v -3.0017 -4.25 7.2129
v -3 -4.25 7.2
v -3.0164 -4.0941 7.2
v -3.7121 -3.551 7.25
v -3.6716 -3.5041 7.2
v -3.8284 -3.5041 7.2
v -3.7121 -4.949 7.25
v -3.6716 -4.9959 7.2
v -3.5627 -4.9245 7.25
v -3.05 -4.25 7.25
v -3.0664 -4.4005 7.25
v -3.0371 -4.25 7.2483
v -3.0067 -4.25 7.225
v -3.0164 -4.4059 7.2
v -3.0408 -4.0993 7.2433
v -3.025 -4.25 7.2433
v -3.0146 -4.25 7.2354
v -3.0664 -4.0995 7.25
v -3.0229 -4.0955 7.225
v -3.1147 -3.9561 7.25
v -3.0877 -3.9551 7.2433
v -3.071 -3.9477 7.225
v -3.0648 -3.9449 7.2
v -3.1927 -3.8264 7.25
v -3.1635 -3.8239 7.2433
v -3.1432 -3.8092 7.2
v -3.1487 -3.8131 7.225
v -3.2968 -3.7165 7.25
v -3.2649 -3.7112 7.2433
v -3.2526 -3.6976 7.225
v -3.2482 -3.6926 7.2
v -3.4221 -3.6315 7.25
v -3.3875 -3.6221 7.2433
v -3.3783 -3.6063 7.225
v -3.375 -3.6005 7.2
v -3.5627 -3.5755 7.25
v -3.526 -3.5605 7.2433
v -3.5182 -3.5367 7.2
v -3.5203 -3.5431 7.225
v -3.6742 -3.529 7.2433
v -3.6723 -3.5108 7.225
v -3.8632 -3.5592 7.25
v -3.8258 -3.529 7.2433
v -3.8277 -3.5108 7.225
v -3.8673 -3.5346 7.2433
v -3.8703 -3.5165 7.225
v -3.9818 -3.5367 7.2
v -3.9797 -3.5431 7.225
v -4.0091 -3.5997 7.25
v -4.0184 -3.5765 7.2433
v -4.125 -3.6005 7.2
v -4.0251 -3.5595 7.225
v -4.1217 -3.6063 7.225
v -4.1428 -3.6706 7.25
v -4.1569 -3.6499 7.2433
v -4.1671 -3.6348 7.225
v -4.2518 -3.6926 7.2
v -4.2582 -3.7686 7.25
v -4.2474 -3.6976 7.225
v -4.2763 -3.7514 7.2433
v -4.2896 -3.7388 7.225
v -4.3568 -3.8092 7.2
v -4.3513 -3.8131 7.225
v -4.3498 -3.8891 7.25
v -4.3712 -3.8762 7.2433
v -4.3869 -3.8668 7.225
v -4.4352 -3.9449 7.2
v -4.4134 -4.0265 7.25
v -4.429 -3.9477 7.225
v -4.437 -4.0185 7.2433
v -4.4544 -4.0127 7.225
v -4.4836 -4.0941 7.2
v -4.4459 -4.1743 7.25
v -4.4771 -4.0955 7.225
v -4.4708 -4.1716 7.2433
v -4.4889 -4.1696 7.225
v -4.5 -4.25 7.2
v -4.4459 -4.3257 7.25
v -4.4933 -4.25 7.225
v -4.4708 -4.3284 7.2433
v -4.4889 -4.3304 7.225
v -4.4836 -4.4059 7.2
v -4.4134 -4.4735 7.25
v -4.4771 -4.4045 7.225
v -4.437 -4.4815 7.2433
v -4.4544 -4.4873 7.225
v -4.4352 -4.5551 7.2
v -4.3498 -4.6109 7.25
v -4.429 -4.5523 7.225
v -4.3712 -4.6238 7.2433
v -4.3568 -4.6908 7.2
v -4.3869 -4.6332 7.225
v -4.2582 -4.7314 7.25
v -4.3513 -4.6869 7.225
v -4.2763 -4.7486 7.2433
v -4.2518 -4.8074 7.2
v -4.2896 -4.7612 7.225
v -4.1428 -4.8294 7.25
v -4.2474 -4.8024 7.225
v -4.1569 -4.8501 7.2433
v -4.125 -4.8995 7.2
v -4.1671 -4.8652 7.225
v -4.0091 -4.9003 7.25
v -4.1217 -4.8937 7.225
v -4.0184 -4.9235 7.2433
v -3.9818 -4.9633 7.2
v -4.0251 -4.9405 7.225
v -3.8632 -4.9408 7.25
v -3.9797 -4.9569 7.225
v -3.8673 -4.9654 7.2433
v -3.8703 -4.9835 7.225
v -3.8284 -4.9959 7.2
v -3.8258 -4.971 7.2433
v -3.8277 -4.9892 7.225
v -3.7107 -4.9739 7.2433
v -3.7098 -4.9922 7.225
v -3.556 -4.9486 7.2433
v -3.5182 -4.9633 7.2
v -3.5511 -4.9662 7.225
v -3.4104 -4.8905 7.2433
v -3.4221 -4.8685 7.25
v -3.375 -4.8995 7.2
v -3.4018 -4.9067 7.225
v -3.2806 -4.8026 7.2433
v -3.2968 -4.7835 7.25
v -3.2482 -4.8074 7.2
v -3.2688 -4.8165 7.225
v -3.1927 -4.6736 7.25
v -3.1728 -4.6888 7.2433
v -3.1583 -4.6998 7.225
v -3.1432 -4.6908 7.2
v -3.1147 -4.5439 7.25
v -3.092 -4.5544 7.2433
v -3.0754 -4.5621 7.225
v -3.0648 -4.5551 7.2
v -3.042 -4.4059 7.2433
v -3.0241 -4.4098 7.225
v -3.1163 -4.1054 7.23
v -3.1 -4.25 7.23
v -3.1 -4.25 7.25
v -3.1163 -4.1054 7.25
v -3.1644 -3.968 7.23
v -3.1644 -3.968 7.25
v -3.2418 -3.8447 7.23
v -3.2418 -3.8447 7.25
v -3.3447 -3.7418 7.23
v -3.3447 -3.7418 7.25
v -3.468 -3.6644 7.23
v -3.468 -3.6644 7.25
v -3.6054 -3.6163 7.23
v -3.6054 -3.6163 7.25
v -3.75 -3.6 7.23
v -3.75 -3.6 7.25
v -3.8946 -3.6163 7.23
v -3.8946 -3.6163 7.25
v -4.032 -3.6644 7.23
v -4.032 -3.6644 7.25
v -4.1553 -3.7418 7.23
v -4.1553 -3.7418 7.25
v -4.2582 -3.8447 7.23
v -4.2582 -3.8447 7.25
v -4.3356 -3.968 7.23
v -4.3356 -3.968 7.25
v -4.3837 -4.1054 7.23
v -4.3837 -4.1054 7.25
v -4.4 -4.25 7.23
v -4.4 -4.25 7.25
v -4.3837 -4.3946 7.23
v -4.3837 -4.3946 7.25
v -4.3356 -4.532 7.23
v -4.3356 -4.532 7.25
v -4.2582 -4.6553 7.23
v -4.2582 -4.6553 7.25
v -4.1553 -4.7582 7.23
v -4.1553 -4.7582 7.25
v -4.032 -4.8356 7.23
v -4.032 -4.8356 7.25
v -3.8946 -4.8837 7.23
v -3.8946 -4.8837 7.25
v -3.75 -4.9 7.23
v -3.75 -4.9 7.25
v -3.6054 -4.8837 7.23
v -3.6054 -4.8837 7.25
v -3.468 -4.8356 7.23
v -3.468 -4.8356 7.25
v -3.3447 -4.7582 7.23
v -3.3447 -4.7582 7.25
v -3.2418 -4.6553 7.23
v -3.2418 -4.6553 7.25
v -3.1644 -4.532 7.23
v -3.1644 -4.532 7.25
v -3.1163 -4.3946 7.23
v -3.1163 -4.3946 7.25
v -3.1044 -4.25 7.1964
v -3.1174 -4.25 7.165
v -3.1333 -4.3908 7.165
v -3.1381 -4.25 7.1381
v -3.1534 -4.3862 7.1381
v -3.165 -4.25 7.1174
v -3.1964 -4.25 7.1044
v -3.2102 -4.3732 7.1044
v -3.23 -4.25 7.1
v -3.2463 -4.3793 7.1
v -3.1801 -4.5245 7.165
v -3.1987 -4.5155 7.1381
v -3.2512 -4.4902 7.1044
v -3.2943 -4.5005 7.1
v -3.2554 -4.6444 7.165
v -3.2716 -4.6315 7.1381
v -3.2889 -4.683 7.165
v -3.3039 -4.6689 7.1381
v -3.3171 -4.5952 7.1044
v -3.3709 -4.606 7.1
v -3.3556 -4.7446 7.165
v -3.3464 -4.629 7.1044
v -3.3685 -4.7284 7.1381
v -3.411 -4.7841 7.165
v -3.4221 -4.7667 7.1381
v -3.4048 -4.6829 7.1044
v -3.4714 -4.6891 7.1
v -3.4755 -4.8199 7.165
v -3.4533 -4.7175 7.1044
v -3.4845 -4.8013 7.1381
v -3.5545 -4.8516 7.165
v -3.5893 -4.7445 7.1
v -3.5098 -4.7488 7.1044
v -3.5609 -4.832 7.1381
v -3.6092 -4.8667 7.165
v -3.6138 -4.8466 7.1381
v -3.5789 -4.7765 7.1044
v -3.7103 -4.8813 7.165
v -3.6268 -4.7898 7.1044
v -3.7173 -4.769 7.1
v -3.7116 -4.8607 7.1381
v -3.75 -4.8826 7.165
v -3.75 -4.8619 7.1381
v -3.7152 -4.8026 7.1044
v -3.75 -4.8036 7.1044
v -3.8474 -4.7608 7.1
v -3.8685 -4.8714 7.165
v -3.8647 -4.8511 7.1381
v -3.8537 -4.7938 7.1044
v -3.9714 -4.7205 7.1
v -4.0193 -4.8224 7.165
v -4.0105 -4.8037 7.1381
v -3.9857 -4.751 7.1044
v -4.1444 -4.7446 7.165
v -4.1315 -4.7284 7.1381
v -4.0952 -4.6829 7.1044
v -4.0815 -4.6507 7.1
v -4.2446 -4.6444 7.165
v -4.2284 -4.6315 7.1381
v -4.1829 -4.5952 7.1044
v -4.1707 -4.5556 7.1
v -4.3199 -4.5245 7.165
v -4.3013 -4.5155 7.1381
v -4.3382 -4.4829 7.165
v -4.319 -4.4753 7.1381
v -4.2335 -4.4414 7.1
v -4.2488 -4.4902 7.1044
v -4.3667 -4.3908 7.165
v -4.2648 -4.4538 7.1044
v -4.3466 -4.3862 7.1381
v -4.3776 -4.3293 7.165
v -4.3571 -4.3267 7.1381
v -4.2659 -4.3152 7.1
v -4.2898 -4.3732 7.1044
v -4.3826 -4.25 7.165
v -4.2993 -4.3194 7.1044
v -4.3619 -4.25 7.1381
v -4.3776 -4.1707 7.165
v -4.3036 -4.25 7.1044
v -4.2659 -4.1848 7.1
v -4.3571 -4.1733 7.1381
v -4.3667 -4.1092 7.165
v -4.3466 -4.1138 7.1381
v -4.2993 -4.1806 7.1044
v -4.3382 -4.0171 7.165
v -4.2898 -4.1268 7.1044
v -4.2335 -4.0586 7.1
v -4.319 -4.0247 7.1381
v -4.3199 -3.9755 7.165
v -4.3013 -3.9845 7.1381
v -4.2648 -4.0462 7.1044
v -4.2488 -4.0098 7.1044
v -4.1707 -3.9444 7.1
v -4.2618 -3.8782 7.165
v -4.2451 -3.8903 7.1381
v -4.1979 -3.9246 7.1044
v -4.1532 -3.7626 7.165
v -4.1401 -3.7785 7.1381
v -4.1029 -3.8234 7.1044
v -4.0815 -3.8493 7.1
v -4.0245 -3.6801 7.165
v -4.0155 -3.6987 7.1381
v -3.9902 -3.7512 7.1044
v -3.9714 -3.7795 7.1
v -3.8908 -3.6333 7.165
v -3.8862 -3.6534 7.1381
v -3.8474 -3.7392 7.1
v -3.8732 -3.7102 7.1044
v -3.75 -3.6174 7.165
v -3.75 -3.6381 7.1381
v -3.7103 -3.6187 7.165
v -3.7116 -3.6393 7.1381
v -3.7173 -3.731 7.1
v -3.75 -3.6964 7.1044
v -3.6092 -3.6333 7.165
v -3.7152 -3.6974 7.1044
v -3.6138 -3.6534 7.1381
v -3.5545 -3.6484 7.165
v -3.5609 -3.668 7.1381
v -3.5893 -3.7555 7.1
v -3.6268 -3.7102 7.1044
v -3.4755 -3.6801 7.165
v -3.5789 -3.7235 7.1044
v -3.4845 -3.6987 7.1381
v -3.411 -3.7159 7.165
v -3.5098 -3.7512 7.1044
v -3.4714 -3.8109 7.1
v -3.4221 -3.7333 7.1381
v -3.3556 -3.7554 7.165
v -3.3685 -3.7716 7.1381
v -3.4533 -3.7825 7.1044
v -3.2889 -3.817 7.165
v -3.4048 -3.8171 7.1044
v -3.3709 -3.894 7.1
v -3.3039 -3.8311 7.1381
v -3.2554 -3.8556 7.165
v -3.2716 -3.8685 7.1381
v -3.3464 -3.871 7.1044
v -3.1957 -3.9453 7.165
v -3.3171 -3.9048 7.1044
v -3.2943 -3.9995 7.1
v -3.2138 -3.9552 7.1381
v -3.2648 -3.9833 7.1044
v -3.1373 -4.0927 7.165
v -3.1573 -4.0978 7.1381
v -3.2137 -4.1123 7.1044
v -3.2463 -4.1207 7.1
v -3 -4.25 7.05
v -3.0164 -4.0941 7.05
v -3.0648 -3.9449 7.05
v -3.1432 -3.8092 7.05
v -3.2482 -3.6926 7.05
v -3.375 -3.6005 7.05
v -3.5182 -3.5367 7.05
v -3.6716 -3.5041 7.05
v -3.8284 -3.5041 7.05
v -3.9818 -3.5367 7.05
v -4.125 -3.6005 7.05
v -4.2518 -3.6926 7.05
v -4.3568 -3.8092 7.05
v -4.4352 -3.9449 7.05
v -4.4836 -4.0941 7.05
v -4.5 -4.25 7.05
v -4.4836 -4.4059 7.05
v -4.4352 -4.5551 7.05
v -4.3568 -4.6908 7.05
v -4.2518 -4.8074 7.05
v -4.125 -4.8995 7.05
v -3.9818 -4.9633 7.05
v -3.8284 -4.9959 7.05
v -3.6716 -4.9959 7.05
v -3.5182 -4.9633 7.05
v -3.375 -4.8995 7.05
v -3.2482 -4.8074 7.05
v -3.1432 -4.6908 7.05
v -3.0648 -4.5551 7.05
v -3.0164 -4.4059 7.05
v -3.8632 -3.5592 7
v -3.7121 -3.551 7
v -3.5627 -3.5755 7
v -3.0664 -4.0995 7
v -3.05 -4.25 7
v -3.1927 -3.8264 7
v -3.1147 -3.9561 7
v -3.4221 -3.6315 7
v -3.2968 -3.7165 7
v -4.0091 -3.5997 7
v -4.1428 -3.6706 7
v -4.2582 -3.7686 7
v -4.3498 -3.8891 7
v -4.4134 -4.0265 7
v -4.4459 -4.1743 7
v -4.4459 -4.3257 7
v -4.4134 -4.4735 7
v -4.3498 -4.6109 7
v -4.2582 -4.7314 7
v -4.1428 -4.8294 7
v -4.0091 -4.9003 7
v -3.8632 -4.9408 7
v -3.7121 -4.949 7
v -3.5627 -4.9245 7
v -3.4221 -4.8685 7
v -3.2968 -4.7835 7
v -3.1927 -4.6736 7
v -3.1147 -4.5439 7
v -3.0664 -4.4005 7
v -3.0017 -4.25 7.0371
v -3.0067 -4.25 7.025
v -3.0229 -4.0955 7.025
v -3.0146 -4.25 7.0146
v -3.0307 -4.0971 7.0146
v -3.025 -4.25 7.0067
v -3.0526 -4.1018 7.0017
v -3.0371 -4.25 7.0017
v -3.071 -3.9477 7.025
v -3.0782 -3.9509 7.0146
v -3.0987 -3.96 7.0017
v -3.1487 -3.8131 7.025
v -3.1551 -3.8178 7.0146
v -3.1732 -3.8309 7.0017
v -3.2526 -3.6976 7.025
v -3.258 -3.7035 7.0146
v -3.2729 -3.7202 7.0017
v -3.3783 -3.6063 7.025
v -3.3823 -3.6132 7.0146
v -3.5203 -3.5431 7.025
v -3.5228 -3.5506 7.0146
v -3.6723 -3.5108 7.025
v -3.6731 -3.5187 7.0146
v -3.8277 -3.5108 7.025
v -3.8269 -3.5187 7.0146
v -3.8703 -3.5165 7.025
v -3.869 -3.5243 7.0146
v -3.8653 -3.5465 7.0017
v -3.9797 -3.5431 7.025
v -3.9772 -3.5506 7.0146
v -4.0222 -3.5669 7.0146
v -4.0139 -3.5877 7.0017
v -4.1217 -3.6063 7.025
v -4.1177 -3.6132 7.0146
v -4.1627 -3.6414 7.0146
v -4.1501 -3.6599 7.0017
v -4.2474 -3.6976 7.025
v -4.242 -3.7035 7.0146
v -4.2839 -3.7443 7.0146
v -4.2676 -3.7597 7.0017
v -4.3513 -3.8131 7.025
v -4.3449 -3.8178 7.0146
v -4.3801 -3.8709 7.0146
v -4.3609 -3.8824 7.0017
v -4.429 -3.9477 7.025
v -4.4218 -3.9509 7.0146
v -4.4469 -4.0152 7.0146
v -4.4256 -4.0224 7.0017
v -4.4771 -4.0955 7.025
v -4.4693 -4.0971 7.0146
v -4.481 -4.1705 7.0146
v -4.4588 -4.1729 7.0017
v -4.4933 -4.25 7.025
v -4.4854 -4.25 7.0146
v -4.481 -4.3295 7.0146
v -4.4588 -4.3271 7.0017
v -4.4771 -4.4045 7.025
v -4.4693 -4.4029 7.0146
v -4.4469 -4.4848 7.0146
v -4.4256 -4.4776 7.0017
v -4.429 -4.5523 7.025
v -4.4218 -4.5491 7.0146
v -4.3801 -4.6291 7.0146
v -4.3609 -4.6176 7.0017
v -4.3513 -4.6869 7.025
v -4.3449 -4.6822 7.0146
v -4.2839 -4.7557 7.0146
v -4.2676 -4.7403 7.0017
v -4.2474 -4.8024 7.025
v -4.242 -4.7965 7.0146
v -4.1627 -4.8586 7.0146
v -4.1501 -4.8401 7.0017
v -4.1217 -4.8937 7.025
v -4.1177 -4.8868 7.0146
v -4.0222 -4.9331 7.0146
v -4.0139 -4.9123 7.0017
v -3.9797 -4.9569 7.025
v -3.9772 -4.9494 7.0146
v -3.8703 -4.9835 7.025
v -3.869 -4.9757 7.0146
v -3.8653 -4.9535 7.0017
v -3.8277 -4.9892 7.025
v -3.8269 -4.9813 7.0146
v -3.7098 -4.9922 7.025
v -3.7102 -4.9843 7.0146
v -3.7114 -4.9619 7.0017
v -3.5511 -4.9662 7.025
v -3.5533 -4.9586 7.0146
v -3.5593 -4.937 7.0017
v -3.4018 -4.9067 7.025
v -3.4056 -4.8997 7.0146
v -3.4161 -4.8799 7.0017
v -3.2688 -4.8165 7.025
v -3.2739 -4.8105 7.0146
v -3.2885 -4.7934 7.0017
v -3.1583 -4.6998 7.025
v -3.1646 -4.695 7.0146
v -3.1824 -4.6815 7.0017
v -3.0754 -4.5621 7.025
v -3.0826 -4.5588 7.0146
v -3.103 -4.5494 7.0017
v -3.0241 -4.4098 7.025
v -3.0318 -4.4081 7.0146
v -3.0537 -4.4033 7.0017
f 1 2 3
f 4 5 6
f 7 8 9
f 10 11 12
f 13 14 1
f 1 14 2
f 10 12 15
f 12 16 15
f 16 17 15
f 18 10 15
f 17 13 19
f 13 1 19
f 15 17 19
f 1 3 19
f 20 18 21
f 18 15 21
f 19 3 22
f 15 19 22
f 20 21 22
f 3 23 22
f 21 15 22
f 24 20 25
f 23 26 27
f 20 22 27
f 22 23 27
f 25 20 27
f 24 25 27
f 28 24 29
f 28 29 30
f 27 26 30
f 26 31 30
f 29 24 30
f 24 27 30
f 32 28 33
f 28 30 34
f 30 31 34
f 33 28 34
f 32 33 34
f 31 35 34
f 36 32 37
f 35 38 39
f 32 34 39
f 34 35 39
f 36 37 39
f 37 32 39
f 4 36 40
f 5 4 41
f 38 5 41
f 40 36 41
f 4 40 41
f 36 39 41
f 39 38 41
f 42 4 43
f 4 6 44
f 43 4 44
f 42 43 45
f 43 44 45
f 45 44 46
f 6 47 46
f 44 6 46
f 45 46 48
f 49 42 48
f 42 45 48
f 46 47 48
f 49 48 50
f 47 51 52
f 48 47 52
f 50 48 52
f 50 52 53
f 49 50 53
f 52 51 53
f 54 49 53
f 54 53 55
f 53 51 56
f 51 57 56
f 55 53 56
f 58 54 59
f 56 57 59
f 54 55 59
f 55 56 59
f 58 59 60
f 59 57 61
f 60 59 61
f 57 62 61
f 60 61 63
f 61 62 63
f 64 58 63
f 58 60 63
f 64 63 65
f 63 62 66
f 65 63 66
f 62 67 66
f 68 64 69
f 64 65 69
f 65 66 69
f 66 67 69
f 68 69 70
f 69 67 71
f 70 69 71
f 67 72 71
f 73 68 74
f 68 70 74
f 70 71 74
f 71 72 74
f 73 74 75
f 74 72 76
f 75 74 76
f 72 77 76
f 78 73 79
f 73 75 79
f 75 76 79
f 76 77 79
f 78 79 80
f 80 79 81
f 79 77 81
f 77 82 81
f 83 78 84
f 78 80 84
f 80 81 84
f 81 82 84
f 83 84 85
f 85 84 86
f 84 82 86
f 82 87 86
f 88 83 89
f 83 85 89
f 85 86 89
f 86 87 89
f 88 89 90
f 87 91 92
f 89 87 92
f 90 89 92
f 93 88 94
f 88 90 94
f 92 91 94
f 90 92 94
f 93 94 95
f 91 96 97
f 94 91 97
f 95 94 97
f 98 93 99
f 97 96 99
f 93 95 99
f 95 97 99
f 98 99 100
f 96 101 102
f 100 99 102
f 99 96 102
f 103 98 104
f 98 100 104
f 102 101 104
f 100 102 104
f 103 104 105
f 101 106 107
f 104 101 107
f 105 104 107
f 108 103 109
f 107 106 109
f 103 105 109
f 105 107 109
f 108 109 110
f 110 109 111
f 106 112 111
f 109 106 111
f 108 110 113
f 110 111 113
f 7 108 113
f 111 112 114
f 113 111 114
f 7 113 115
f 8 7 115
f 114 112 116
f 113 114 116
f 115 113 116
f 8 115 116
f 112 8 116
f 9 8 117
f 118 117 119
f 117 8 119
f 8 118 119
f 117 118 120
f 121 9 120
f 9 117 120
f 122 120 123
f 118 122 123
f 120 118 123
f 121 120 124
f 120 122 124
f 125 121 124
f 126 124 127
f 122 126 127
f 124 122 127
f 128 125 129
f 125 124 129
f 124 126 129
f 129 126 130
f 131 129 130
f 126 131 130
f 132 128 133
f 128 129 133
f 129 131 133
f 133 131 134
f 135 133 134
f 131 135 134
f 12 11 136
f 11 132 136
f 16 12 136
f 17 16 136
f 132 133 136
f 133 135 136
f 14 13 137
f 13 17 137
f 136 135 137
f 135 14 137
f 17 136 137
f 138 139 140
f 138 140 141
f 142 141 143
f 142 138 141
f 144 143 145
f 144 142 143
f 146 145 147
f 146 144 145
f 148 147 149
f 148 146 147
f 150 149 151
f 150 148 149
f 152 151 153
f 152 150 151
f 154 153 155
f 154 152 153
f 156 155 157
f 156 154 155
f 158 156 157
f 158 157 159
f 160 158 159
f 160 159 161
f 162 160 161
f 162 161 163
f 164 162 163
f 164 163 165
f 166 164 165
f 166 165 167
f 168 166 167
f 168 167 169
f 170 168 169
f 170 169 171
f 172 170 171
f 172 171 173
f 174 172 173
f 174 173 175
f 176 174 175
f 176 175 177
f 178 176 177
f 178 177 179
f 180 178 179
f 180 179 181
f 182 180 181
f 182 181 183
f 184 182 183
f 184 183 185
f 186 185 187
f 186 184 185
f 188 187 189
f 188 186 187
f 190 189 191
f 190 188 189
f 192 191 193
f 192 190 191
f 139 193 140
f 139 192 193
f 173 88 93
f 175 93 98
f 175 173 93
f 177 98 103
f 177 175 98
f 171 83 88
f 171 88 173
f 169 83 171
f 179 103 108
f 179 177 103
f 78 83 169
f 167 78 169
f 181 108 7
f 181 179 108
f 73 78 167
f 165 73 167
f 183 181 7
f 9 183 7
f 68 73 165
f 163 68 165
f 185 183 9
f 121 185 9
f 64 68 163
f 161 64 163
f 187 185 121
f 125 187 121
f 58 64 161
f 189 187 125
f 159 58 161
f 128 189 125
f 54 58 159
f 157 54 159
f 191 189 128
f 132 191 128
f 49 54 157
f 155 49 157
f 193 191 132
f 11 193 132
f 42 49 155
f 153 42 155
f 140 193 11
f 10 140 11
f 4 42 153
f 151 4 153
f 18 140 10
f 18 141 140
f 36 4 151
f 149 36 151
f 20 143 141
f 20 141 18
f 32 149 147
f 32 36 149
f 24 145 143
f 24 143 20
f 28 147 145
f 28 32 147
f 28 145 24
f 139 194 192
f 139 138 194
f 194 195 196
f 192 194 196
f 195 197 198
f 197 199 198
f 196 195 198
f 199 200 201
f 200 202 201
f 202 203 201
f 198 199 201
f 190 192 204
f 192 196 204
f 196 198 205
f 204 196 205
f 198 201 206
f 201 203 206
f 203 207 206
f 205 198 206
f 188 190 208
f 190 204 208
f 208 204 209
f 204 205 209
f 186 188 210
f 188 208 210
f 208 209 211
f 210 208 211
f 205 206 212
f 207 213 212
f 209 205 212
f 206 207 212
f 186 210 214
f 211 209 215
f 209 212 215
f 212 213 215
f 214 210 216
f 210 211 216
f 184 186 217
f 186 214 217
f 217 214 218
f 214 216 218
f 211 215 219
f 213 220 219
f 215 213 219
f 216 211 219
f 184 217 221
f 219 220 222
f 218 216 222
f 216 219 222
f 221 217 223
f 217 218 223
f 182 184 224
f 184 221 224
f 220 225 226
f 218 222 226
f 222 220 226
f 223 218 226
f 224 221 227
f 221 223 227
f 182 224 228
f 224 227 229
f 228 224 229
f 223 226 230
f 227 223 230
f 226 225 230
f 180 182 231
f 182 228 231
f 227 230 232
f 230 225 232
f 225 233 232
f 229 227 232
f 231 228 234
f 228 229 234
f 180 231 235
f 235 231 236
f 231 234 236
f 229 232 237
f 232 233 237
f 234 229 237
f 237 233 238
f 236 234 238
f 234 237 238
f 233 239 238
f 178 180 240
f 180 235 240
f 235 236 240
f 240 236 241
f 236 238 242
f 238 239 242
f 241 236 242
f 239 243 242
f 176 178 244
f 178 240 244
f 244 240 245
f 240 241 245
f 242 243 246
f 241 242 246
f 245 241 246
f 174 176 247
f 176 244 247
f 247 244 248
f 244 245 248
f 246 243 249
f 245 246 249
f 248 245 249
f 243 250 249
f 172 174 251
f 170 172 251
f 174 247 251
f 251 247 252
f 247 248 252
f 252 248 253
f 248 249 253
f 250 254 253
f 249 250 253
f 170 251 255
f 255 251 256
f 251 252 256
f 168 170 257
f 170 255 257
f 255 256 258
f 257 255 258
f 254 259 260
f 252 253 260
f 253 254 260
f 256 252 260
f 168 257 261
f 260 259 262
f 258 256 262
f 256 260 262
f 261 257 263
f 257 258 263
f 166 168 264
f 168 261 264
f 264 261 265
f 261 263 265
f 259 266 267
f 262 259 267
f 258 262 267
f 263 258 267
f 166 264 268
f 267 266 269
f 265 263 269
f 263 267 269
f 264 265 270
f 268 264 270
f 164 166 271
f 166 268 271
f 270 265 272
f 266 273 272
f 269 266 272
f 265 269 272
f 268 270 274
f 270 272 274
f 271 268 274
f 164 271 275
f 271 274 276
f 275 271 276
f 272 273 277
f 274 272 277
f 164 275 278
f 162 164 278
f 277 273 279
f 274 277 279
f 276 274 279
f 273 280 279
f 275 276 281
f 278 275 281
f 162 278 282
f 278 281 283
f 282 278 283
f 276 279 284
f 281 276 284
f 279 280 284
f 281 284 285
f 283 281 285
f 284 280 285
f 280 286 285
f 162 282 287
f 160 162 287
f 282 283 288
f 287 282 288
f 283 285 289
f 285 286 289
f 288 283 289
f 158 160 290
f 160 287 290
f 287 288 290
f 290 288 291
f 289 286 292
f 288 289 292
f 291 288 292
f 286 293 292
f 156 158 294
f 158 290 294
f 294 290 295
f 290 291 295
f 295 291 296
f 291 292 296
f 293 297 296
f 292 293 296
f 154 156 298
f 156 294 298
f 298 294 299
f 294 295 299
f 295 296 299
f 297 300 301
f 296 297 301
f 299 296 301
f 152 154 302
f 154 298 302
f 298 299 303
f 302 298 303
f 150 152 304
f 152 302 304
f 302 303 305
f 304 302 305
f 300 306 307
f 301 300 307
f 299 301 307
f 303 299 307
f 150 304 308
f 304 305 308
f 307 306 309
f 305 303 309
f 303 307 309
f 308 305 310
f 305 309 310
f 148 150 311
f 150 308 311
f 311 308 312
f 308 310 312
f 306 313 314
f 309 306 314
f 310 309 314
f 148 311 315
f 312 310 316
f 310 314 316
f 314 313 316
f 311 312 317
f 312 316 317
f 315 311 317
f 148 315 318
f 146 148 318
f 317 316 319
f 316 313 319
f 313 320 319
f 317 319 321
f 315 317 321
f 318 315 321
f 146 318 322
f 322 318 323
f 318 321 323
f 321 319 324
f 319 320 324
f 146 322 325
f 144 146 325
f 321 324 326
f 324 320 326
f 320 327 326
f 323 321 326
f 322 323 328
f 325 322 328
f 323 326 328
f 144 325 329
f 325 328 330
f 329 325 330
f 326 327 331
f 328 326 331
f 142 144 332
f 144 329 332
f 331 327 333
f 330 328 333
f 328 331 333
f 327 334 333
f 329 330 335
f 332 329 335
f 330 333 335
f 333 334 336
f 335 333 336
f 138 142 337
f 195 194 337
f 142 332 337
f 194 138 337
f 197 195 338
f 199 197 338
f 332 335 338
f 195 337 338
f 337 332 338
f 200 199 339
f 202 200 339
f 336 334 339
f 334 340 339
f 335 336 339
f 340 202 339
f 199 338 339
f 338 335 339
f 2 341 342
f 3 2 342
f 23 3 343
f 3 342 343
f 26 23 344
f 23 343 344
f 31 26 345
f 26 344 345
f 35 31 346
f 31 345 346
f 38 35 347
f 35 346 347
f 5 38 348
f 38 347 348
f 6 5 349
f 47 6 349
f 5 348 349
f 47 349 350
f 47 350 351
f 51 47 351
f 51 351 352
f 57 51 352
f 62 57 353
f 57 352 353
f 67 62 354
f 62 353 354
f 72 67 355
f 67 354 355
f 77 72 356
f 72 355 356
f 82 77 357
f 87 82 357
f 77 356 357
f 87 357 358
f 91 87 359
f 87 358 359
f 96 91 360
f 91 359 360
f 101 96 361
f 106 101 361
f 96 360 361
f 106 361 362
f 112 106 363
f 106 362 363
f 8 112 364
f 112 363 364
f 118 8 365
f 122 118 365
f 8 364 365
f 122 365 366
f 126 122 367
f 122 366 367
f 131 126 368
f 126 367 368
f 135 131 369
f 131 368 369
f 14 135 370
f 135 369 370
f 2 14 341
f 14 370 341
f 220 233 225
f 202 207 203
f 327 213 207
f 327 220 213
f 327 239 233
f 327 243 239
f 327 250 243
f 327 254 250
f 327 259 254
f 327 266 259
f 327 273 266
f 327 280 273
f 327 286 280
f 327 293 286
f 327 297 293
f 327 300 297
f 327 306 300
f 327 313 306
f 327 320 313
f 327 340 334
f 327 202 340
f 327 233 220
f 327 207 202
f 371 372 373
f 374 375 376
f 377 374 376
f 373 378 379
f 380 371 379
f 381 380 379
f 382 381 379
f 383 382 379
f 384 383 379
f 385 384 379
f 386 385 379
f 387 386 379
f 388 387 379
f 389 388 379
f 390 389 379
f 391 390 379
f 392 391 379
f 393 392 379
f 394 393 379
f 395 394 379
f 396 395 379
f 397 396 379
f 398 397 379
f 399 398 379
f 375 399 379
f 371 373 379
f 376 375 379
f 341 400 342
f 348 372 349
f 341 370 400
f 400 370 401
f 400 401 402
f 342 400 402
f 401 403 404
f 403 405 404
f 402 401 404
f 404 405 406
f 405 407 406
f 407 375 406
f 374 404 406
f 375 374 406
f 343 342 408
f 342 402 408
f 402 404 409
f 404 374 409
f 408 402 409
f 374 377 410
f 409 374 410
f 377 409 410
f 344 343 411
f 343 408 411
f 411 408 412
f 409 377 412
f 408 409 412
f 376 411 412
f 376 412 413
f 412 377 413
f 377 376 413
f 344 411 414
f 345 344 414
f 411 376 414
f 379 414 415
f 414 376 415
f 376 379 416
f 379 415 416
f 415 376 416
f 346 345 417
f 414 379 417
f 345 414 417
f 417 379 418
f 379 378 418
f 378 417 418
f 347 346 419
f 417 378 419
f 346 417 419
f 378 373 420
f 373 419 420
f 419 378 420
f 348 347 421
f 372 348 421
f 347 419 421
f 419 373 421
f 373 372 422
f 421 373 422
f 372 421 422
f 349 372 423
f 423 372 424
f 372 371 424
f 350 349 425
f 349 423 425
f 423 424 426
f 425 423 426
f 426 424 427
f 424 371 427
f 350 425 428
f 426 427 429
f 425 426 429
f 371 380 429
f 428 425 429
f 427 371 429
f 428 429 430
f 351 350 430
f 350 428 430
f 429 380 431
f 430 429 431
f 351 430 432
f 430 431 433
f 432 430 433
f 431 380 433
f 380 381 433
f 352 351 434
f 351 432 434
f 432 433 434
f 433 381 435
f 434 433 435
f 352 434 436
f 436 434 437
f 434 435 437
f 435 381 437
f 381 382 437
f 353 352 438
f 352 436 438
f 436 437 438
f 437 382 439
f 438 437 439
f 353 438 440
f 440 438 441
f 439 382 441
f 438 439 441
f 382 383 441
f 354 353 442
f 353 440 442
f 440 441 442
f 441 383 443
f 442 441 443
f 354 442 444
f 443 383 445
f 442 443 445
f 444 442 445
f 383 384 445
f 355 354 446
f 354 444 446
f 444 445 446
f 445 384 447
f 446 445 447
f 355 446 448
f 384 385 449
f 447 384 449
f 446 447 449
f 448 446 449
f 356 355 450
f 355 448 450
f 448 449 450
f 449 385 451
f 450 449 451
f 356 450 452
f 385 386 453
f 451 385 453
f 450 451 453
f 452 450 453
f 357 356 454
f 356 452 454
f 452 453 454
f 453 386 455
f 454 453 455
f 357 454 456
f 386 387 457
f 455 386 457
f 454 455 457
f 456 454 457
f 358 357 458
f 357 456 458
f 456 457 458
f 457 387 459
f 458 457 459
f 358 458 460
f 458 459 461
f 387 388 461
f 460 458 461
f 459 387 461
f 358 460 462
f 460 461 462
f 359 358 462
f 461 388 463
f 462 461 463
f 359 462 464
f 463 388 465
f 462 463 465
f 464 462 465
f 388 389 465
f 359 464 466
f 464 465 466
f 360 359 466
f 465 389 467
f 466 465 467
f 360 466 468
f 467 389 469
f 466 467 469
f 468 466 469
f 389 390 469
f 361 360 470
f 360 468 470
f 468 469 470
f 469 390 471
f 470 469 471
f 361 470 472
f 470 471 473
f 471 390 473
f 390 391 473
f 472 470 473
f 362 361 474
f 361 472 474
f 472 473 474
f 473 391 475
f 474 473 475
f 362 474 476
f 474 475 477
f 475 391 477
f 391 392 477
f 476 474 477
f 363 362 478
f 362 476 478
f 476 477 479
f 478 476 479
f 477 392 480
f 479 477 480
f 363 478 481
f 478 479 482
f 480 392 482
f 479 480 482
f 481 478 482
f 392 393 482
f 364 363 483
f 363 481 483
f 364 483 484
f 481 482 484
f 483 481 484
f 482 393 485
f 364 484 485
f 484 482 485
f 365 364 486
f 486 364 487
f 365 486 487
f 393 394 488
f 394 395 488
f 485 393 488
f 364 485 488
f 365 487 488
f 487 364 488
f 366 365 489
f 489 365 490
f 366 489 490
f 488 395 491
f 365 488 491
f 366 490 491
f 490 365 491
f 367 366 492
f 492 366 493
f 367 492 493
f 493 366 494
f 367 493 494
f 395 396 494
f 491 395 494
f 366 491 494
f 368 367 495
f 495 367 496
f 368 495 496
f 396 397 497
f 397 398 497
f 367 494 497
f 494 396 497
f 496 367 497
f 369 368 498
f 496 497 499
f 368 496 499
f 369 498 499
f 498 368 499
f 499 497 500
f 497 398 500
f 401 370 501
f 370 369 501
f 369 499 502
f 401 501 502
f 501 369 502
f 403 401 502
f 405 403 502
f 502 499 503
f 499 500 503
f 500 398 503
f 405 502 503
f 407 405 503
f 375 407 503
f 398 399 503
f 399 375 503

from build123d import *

# Parameters (mm, degrees)
SKETCH011_R    = 0.75
PAD004_DEPTH   = 0.25
THICKNESS001_T = -0.1
FILLET002_R    = 0.13
FILLET003_R    = 0.05


with BuildPart() as part:
    # Sketch011 → Pad004 (new body)
    with BuildSketch(Plane(origin=(-3.75, -4.25, 7), x_dir=(1, 0, 0), z_dir=(0, 0, 1))):
        Circle(SKETCH011_R)
    extrude(amount=PAD004_DEPTH)

    # Thickness001
    thickness001_openings = [part.faces().sort_by_distance(p)[0] for p in [
        (-3.75, -4.25, 7.25),
    ]]
    offset(amount=THICKNESS001_T, openings=thickness001_openings)

    # Fillet002
    fillet002_edges = [part.edges().sort_by_distance(p)[0] for p in [
        (-4.4, -4.25, 7.1),
    ]]
    fillet(fillet002_edges, radius=FILLET002_R)

    # Fillet003
    fillet003_edges = [part.edges().sort_by_distance(p)[0] for p in [
        (-4.5, -4.25, 7),
        (-4.5, -4.25, 7.25),
    ]]
    fillet(fillet003_edges, radius=FILLET003_R)


solid = part.part
